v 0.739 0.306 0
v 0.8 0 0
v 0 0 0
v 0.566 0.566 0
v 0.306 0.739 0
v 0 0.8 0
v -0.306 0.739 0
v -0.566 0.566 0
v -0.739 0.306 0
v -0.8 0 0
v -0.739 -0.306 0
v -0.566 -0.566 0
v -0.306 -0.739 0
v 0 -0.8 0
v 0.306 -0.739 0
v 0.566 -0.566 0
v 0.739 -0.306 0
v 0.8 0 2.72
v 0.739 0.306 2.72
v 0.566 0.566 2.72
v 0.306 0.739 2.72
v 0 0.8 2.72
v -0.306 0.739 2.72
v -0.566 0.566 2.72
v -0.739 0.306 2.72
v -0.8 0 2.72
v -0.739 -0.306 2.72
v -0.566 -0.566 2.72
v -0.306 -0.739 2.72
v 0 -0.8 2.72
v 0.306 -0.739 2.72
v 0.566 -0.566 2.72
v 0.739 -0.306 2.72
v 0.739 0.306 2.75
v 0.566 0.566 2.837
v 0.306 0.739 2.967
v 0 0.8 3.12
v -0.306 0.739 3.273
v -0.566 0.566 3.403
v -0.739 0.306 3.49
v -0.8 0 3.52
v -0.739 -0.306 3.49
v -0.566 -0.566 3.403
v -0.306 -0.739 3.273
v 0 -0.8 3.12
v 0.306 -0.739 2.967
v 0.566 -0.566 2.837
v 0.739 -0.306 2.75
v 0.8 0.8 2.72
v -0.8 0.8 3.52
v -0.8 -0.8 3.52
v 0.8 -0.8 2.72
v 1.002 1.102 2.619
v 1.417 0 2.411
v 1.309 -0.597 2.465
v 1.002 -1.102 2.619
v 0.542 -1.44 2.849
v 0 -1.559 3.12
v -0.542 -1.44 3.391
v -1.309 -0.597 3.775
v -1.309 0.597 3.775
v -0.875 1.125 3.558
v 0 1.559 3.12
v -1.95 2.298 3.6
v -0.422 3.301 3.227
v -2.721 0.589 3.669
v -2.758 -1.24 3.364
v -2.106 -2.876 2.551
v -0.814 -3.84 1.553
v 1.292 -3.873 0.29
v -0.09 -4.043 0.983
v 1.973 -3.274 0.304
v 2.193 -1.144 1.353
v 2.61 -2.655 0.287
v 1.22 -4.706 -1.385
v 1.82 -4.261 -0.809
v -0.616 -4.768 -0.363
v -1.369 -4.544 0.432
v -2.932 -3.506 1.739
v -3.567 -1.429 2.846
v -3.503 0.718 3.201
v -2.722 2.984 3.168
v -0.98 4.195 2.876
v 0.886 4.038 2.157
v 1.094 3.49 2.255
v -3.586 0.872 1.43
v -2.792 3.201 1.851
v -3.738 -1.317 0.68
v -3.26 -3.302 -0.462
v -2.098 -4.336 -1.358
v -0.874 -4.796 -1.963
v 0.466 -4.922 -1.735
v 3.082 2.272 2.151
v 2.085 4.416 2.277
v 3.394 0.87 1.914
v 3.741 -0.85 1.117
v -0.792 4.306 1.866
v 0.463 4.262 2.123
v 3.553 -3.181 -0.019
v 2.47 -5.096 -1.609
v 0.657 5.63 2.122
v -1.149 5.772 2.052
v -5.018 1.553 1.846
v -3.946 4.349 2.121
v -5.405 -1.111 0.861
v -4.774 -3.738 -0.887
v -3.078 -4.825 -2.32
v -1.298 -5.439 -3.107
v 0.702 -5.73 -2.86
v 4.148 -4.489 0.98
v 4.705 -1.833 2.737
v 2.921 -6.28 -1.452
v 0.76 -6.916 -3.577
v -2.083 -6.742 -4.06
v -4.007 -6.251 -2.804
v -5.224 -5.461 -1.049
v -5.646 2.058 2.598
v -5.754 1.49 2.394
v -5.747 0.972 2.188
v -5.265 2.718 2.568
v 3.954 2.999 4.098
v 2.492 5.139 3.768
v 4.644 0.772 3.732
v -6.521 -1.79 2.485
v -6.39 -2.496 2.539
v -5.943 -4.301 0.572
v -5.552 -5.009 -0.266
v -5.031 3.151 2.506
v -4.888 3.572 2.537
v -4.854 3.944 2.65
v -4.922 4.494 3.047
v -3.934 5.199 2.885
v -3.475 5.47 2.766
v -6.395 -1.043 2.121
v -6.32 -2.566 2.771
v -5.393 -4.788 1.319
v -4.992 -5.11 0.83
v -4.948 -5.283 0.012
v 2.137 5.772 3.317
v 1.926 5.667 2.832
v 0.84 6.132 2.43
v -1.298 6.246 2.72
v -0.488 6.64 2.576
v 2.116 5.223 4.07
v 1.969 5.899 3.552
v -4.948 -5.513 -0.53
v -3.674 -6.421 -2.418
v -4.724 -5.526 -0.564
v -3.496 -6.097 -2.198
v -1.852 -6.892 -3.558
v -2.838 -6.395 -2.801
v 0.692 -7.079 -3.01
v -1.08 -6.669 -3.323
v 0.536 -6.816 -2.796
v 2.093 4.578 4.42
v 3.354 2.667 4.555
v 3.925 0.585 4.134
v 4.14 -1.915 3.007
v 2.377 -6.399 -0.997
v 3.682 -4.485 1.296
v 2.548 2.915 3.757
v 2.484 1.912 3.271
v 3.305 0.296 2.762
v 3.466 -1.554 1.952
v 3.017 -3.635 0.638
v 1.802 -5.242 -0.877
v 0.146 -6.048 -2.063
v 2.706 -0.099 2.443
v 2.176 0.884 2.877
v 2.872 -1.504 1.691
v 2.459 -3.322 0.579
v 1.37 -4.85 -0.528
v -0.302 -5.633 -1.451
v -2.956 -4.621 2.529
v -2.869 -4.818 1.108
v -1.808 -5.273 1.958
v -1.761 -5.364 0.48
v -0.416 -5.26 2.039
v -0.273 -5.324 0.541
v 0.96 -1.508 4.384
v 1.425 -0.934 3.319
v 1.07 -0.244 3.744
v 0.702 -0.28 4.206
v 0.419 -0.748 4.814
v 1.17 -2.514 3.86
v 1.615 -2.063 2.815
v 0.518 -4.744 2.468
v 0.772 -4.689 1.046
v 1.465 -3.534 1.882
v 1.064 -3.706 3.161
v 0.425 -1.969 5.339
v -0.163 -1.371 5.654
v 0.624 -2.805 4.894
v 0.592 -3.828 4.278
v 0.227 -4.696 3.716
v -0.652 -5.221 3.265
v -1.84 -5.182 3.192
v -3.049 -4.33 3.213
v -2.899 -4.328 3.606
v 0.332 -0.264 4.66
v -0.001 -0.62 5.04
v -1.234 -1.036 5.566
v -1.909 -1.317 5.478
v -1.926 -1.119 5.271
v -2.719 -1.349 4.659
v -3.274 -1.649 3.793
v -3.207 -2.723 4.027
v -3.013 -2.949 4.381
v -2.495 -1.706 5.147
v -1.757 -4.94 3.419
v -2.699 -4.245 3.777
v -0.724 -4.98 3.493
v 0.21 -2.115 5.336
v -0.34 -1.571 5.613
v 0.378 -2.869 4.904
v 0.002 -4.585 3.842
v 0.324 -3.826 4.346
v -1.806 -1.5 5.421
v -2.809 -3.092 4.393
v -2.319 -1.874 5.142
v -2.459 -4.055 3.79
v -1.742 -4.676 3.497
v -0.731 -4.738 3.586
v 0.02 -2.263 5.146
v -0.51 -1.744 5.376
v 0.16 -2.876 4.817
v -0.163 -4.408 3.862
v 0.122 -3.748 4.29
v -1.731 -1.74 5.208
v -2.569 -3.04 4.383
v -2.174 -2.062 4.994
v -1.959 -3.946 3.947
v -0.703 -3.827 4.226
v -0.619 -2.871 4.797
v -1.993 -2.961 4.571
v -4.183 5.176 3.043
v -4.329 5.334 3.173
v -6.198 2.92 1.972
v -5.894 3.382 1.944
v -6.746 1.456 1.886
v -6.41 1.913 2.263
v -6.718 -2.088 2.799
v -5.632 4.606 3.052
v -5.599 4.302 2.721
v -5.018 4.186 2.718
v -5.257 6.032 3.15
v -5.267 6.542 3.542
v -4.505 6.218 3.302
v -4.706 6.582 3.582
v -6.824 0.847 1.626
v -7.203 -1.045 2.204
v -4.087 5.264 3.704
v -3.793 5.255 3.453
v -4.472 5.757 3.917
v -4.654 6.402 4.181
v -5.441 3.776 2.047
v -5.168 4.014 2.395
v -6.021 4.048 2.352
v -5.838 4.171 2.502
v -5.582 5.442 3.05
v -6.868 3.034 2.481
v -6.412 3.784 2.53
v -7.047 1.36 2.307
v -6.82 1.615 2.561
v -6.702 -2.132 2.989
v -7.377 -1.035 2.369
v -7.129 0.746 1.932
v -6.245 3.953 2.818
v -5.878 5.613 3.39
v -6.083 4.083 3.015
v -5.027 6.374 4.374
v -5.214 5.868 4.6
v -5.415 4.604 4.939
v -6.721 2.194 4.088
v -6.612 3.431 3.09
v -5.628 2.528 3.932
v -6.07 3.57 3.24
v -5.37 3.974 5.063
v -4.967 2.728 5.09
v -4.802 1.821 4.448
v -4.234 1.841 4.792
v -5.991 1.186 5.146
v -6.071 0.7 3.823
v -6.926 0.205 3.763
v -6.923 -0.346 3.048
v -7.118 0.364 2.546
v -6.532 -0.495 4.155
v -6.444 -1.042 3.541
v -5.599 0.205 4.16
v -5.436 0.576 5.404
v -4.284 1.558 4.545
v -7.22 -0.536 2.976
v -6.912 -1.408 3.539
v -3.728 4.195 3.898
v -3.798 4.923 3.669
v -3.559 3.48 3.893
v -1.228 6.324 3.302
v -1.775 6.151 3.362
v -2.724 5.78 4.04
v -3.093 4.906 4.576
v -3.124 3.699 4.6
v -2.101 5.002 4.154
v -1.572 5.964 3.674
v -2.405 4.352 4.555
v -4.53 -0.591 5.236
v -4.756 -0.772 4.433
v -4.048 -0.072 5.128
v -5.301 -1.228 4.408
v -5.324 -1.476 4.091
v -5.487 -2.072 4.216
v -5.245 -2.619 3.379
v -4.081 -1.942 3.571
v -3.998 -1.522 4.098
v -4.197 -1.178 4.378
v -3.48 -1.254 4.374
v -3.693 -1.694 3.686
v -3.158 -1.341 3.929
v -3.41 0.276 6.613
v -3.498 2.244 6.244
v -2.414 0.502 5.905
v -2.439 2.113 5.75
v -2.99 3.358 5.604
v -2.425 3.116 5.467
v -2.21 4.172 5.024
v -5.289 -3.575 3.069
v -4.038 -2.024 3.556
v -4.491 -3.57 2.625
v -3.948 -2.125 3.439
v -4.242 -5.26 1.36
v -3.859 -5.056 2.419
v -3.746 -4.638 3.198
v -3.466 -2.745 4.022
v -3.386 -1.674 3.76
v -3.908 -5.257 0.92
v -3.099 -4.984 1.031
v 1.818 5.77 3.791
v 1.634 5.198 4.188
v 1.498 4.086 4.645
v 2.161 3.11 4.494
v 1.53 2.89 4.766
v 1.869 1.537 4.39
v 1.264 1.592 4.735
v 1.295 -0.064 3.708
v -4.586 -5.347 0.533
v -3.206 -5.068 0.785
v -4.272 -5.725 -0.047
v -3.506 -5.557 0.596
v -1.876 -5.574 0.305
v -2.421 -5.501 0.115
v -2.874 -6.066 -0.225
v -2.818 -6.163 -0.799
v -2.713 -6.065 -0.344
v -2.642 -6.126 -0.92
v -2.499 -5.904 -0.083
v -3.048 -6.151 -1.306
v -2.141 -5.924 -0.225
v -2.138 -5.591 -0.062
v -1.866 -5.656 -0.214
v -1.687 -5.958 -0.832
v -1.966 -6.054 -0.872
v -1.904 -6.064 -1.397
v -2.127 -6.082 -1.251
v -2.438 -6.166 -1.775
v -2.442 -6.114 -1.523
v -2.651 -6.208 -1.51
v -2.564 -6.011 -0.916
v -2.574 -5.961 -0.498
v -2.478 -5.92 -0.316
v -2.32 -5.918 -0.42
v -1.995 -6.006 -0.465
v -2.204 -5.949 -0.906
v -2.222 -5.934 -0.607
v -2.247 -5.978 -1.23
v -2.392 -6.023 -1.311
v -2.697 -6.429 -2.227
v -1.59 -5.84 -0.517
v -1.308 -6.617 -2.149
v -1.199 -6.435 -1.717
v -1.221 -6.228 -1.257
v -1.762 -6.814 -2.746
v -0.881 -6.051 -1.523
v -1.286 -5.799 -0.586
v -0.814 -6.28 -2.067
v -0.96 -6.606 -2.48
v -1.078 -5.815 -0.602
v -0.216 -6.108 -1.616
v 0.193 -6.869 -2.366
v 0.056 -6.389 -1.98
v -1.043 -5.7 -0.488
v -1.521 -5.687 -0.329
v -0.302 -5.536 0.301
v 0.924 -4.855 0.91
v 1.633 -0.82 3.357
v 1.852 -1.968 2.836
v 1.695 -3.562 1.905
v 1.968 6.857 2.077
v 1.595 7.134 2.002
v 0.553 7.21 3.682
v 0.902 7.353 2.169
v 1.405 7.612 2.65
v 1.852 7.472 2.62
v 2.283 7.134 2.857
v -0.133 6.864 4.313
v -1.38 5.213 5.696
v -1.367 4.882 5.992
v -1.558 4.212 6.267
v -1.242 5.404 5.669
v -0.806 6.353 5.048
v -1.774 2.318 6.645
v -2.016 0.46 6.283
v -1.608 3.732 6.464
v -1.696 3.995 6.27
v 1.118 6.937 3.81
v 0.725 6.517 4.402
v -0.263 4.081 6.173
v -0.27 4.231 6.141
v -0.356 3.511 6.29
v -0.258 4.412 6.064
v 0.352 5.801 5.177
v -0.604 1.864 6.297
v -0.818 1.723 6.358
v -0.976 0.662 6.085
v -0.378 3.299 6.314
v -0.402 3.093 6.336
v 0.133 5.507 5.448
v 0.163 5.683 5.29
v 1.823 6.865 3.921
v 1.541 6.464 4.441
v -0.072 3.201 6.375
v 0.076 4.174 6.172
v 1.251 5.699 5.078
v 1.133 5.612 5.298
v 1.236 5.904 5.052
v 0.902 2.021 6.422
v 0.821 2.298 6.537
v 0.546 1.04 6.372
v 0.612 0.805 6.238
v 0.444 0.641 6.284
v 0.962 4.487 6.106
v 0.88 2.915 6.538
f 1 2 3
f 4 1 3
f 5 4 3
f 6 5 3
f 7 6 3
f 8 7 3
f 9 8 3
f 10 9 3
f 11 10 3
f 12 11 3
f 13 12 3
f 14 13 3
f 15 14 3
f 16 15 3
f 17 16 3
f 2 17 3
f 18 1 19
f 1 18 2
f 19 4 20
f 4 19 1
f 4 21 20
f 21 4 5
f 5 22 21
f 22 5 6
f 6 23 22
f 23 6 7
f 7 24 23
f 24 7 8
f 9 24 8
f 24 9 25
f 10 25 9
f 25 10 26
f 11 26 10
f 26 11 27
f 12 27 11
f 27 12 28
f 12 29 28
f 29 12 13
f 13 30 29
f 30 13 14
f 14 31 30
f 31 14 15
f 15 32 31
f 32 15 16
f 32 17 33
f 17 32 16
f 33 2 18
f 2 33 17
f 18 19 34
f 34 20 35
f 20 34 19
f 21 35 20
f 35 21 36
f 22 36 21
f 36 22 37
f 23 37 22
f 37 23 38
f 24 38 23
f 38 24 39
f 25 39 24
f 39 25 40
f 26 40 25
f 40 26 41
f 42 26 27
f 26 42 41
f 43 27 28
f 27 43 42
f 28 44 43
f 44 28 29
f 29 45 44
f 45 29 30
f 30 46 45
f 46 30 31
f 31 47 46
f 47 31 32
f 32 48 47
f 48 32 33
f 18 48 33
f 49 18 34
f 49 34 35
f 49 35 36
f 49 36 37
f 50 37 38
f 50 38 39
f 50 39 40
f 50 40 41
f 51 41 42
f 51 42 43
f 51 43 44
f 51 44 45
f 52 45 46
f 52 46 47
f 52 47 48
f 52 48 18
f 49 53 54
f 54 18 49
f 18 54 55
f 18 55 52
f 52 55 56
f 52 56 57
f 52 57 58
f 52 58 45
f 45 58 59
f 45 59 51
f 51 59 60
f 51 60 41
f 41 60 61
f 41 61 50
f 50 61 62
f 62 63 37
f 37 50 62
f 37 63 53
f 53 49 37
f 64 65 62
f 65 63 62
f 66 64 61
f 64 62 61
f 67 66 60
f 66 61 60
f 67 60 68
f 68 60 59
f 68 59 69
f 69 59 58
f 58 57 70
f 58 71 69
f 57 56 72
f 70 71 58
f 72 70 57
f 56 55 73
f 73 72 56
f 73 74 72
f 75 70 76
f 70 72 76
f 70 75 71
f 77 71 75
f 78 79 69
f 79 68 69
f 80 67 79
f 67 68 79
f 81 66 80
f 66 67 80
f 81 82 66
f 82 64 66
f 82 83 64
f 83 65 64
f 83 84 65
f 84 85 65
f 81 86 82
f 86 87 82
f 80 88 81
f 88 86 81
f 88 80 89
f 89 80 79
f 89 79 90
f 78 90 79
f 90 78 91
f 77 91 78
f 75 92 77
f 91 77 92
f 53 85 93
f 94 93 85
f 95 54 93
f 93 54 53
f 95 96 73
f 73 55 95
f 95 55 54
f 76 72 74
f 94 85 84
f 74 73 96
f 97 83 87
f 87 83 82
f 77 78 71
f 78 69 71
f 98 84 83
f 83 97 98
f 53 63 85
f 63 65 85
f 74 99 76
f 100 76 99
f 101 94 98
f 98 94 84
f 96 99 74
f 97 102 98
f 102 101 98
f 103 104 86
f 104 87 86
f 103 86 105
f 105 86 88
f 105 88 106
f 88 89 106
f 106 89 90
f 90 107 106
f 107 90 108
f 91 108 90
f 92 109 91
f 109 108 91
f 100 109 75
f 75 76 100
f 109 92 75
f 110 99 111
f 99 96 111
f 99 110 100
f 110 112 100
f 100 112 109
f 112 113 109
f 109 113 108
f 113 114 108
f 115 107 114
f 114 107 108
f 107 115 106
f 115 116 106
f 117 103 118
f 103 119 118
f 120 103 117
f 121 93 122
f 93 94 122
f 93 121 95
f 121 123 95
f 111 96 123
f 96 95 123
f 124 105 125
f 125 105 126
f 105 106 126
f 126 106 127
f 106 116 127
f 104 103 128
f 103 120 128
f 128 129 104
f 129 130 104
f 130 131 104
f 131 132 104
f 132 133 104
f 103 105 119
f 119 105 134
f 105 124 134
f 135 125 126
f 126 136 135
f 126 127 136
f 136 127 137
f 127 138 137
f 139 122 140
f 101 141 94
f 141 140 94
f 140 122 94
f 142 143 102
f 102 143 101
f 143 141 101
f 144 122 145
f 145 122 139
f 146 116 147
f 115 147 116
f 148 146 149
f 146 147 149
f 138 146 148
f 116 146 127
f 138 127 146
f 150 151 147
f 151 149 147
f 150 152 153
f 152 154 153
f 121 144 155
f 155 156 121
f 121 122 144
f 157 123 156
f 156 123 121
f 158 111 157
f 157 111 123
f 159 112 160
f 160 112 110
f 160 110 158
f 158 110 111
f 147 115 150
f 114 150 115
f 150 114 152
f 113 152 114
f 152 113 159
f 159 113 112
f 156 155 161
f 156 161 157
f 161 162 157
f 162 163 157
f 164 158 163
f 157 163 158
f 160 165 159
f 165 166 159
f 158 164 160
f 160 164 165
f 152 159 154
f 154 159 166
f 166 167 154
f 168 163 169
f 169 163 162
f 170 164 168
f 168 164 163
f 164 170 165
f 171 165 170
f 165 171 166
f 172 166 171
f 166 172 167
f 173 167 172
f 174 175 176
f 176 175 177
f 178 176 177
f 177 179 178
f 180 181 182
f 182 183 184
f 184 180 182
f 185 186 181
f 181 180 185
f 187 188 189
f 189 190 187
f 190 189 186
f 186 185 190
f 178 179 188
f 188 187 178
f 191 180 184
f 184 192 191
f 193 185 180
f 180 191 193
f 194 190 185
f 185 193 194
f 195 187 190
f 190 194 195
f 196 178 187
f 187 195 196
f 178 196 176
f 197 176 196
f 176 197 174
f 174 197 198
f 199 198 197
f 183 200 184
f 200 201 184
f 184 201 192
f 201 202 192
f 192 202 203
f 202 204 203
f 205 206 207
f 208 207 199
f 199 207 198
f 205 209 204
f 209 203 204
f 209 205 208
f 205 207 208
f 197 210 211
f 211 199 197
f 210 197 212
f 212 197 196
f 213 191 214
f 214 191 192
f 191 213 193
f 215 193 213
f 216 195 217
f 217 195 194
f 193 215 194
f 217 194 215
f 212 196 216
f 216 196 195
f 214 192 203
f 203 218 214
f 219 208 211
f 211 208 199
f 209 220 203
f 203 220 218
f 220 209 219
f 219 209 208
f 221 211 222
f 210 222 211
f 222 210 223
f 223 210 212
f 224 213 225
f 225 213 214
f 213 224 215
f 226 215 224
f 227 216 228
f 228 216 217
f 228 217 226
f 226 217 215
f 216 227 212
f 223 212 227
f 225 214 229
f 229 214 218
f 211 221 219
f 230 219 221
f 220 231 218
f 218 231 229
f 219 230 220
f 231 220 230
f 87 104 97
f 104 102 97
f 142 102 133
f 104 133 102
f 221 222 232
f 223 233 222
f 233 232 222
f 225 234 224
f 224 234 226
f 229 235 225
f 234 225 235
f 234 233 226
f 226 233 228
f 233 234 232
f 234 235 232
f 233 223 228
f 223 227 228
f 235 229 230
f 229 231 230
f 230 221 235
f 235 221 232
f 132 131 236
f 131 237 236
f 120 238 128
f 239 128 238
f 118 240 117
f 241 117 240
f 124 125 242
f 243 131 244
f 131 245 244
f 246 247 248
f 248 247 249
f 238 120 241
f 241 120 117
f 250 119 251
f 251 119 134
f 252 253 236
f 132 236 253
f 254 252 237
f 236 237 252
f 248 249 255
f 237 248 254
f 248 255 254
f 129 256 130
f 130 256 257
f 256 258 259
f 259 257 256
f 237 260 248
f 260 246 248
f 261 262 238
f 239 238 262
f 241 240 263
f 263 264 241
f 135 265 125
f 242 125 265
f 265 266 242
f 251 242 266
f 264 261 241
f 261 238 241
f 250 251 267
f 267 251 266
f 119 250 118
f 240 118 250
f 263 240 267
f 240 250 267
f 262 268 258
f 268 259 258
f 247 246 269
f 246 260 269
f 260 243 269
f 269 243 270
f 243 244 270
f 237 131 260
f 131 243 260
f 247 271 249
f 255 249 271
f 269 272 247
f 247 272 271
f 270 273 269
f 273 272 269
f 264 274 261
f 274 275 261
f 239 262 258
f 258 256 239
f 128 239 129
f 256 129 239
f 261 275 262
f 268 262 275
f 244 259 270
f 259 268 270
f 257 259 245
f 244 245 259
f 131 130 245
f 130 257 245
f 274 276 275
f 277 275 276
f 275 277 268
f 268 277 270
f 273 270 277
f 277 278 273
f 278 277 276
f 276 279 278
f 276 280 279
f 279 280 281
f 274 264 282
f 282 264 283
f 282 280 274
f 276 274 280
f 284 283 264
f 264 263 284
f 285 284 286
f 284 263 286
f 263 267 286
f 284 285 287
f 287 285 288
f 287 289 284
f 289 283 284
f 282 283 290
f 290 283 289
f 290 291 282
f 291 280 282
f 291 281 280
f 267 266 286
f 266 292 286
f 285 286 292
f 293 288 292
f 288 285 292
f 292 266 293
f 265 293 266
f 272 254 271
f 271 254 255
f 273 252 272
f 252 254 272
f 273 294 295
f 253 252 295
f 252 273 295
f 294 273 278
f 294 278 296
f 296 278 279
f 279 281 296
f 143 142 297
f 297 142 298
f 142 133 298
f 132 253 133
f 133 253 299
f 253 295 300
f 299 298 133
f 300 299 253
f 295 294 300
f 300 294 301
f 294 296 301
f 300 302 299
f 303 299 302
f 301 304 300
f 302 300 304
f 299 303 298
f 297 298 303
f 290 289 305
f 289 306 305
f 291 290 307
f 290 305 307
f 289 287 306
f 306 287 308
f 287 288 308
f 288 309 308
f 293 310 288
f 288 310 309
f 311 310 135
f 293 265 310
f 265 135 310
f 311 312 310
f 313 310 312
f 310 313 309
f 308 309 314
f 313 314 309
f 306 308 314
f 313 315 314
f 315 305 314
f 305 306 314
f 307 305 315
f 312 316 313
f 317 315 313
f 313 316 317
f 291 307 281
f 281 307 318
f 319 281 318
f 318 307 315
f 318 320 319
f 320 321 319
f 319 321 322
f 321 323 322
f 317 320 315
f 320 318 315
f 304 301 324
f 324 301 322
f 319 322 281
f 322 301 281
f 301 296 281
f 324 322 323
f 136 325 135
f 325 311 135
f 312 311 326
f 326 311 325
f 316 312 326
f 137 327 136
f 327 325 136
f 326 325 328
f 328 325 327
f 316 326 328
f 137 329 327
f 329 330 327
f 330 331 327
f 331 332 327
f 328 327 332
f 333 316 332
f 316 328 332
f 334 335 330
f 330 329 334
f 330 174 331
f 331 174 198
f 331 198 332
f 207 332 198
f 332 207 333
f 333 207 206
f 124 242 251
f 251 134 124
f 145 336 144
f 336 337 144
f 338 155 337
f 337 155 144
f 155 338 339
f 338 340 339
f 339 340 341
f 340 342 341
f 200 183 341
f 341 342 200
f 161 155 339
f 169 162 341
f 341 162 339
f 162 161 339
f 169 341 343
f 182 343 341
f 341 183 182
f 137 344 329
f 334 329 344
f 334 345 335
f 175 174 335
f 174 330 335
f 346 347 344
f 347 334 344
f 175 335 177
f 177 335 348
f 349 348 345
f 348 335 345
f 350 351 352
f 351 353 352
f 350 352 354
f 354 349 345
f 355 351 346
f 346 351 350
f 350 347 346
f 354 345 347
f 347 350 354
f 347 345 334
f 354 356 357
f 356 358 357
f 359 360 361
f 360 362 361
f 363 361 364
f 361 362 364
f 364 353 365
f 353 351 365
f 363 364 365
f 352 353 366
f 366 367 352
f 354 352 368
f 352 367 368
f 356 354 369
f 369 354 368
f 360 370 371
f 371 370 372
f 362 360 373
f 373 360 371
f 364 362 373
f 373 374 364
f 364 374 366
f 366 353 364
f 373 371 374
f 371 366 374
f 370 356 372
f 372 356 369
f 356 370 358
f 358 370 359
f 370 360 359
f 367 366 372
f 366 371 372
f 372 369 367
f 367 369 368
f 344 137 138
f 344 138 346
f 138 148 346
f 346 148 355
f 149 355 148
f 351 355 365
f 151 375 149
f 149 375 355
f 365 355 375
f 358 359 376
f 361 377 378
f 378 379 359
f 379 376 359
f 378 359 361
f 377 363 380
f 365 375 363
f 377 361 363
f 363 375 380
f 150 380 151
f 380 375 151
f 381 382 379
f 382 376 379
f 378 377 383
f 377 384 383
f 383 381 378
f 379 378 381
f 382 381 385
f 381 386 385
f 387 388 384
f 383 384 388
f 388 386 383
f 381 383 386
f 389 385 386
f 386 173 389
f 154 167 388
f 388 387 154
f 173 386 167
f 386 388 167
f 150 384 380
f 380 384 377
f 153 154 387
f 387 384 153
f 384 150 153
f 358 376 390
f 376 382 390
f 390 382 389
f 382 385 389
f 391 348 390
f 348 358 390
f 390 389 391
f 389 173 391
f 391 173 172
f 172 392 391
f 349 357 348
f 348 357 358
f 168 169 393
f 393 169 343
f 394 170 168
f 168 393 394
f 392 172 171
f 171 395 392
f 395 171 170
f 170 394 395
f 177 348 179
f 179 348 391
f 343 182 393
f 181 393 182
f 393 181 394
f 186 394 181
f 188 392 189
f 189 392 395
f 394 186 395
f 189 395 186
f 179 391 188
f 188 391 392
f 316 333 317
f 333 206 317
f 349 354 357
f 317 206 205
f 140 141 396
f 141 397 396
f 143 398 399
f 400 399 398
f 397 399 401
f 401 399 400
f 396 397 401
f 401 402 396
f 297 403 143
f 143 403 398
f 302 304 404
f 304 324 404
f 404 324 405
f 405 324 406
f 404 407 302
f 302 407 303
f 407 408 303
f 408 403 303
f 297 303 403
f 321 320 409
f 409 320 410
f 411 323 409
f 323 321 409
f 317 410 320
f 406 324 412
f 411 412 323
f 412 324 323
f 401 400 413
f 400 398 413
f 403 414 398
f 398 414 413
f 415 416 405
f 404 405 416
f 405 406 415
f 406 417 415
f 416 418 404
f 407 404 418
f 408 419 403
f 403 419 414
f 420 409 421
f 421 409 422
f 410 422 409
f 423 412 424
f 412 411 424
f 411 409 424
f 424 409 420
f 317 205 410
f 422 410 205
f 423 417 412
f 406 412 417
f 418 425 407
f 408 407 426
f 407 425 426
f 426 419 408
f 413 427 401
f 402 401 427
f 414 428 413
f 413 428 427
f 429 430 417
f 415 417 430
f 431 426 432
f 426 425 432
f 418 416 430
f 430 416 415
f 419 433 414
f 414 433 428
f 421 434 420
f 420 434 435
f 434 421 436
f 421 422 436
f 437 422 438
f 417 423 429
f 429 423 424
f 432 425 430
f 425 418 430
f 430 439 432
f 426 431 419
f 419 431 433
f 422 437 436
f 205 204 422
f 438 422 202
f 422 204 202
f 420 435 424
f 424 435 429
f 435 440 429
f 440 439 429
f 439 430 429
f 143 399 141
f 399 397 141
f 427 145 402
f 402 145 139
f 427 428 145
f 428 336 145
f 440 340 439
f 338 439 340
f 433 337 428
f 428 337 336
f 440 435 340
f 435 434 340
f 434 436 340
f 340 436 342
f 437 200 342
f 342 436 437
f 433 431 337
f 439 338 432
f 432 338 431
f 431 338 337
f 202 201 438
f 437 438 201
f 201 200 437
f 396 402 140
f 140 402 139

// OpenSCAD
use <../lib.scad>
use <s/13746s01.scad>
use <s/13746s02.scad>
use <s/13746s03.scad>
function ldraw_lib__13746() = [
// 0 Minifig Hat with Small Pin, Women's Fedora with Large Bow and Feather
// 0 Name: 13746.dat
// 0 Author: Lisa Winter [LisaWinter]
// 0 !LDRAW_ORG Part UPDATE 2024-08
// 0 !LICENSE Licensed under CC BY 4.0 : see CAreadme.txt
// 
// 0 BFC CERTIFY CCW
  [0,"BFC","CERTIFY"],
  [0,"BFC","CCW"],
// 
// 0 !HISTORY 2013-08-14 {LEGO Digital Designer} Original part shape
// 0 !HISTORY 2024-09-04 [LisaWinter] File preparation for LDraw Parts Tracker
// 0 !HISTORY 2024-09-30 [OrionP] Official Update 2024-08
// 
// 0 // Main part
// 1 16 0 0 0 1 0 0 0 1 0 0 0 1 s\13746s01.dat
  [1,16,0,0,0,1,0,0,0,1,0,0,0,1, ldraw_lib__s__13746s01()],
// 0 // Bow
// 1 16 0 0 0 1 0 0 0 1 0 0 0 1 s\13746s02.dat
  [1,16,0,0,0,1,0,0,0,1,0,0,0,1, ldraw_lib__s__13746s02()],
// 0 // Feather
// 1 16 0 0 0 1 0 0 0 1 0 0 0 1 s\13746s03.dat
  [1,16,0,0,0,1,0,0,0,1,0,0,0,1, ldraw_lib__s__13746s03()],
];
module ldraw_lib__13746(step=0, col=false, unit=2/5, alt=false, line=0.2, solid=!$preview)
    makepoly(ldraw_lib__13746(), step=step, col=col, unit=unit, alt=alt, line=line, solid=solid);
ldraw_lib__13746(line=0.2);
